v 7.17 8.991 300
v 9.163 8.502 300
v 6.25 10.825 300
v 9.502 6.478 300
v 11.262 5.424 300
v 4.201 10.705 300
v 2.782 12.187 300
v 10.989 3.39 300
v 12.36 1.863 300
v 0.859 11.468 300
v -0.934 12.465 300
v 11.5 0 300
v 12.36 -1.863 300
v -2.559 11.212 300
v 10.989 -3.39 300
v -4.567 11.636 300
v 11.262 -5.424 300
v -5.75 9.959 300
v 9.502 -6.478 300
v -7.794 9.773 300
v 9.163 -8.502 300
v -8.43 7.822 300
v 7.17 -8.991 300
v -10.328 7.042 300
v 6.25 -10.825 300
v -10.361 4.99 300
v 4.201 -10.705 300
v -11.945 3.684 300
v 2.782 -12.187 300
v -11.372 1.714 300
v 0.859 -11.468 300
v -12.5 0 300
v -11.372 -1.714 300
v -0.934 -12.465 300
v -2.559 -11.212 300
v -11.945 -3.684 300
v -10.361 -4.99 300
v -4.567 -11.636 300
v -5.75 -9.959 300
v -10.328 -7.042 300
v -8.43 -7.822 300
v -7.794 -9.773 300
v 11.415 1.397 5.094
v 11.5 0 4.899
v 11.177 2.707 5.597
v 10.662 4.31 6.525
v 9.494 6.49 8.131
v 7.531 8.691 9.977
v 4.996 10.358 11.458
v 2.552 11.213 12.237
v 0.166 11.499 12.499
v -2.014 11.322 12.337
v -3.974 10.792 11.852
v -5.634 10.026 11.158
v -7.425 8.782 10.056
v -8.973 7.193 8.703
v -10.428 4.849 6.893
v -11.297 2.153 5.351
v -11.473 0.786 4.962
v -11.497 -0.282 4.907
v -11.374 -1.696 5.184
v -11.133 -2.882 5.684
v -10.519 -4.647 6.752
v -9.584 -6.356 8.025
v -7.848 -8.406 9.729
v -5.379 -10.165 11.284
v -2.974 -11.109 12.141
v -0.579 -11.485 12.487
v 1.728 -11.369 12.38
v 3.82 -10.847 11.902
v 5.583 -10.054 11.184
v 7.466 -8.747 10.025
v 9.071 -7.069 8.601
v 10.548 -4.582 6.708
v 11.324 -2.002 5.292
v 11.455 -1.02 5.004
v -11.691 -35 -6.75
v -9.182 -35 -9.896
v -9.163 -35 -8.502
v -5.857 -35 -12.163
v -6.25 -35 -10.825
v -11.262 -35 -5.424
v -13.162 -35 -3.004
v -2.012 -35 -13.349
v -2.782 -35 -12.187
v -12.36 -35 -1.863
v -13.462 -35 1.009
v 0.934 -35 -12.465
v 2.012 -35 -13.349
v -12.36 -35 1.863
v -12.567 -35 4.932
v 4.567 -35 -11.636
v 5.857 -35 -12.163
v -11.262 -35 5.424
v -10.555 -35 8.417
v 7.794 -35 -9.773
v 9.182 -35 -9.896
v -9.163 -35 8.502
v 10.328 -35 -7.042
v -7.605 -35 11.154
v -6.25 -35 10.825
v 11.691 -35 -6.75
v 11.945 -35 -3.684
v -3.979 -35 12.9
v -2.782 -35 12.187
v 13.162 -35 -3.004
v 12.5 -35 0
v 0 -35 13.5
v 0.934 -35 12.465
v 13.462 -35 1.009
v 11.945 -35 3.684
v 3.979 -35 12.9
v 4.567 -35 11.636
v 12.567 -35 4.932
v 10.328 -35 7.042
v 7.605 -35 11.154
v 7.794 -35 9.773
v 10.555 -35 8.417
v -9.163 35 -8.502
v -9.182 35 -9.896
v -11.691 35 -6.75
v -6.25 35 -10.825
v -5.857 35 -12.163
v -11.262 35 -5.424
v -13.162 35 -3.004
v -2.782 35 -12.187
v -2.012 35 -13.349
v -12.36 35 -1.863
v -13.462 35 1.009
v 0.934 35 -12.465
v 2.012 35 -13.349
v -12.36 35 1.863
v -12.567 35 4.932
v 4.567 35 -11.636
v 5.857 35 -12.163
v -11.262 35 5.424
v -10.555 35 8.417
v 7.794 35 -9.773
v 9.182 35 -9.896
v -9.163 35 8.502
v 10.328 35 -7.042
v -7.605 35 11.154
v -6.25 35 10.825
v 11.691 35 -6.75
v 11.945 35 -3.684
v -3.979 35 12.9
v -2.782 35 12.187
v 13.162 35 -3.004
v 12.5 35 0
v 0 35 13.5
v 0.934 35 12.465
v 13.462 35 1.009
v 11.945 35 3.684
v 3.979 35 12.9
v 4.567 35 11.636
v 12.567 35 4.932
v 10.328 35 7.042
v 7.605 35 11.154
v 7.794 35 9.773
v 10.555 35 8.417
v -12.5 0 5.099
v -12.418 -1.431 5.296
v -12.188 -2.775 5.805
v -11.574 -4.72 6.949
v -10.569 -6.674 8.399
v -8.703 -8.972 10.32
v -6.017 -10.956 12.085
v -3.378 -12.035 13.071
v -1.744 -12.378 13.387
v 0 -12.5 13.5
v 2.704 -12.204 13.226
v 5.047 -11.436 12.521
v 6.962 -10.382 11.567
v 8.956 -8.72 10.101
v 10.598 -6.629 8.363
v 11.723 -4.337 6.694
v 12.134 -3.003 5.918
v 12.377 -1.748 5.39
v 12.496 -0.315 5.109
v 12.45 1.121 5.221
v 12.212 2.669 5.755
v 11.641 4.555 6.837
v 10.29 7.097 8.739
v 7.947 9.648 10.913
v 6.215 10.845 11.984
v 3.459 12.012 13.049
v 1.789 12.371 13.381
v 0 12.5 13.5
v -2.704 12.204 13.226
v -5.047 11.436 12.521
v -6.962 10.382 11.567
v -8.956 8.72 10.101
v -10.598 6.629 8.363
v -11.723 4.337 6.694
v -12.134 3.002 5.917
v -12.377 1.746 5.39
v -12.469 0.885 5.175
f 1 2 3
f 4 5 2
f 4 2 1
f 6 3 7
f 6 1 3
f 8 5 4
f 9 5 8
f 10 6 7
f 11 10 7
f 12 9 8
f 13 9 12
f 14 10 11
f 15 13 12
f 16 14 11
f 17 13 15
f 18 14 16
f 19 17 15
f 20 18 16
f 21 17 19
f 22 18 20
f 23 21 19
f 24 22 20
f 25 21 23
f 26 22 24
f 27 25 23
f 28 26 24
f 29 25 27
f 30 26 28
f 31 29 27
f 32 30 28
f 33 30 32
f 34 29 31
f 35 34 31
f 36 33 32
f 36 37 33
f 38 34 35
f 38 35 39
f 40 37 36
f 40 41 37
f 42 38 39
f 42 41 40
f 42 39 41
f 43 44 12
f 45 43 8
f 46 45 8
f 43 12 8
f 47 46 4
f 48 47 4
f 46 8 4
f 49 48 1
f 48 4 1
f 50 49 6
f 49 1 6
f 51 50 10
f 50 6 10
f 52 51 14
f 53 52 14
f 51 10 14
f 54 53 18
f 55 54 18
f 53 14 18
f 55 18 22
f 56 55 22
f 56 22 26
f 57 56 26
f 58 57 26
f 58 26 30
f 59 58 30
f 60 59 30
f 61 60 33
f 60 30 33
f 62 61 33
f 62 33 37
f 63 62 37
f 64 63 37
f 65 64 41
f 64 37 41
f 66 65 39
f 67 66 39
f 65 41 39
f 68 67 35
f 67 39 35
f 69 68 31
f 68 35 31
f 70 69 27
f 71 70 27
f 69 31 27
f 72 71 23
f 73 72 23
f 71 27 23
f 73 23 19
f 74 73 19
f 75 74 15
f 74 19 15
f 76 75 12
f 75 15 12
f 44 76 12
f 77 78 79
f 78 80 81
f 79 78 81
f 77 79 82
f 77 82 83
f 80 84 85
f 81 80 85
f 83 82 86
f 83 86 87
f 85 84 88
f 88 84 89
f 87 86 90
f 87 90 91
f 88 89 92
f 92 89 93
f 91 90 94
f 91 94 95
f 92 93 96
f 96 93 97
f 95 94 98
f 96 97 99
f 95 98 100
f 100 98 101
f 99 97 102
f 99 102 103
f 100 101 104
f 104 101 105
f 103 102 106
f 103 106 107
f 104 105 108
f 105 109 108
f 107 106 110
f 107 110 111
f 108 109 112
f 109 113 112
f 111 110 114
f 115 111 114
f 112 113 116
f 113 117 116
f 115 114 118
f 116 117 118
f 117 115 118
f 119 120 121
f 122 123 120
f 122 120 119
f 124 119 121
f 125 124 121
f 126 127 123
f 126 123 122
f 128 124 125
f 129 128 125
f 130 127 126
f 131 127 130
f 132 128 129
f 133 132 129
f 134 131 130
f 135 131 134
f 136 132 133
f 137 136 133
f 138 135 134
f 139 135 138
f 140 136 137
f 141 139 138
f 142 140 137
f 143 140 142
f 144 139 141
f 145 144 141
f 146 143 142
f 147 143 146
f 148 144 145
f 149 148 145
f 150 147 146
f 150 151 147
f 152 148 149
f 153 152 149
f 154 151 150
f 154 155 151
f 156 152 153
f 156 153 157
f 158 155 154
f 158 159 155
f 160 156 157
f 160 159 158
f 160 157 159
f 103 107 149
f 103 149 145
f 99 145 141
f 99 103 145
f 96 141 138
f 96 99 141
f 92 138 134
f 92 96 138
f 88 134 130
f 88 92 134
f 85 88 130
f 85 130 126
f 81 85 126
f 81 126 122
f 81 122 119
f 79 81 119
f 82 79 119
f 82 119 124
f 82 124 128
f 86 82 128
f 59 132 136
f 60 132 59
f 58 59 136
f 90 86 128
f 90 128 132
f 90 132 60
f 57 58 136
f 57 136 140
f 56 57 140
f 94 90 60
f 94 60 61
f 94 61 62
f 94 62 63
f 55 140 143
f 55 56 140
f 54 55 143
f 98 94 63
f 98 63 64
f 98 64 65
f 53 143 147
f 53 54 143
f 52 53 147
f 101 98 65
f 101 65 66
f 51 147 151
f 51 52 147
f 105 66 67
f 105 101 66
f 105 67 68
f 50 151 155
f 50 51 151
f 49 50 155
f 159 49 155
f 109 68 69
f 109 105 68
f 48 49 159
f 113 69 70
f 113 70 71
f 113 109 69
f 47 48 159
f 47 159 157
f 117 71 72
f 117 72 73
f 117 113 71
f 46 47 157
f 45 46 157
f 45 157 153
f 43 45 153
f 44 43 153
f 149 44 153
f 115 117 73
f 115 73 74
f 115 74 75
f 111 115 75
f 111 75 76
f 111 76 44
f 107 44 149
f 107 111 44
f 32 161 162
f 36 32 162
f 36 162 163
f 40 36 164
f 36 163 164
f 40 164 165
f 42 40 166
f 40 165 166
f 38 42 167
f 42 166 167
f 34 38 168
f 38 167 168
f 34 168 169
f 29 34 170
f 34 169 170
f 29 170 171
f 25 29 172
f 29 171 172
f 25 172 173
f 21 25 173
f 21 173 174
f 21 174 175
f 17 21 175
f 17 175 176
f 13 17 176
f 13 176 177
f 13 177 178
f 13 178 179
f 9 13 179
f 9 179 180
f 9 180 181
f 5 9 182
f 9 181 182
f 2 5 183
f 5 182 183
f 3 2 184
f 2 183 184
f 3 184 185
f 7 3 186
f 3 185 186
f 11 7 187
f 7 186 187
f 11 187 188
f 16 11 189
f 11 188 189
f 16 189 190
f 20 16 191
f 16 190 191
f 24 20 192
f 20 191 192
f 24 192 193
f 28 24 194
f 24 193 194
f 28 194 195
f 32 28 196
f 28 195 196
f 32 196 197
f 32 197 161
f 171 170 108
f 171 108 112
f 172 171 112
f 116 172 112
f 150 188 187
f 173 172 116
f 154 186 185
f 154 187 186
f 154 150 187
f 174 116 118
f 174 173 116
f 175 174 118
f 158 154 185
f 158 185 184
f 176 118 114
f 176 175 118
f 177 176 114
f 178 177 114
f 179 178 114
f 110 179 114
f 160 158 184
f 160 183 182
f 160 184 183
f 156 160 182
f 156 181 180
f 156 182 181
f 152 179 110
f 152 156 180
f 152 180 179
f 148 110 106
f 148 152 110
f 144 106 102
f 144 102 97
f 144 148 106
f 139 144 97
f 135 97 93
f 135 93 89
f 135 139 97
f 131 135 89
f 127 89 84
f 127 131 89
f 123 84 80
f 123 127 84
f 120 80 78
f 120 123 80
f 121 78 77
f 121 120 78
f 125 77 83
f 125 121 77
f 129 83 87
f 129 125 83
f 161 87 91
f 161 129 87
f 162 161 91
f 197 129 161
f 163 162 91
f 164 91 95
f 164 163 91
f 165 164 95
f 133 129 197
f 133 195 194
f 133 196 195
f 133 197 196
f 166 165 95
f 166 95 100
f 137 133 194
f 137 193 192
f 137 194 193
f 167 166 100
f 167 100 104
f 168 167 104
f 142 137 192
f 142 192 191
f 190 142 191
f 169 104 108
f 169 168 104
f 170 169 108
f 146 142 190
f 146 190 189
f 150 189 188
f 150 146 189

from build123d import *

# Parameters (mm, degrees)
SKETCH1_R           = 13.5
BOSS_EXTRUDE1_DEPTH = 35
SKETCH2_R           = 12.5
BOSS_EXTRUDE2_DEPTH = 300
SHELL1_T            = -1


with BuildPart() as part:
    # Sketch1 → Boss-Extrude1 (new, symmetric)
    with BuildSketch(Plane(origin=(0, 0, 0), x_dir=(1, 0, 0), z_dir=(0, 1, 0))):
        Circle(SKETCH1_R)
    extrude(amount=BOSS_EXTRUDE1_DEPTH, both=True)

    # Sketch2 → Boss-Extrude2 (add)
    with BuildSketch(Plane.XY):
        Circle(SKETCH2_R)
    extrude(amount=BOSS_EXTRUDE2_DEPTH)

    # Shell1
    shell1_openings = [part.faces().sort_by_distance(p)[0] for p in [
        (0, 35, 0),
        (0, 0, 300),
        (0, -35, 0),
    ]]
    offset(amount=SHELL1_T, openings=shell1_openings, kind=Kind.INTERSECTION)


solid = part.part
